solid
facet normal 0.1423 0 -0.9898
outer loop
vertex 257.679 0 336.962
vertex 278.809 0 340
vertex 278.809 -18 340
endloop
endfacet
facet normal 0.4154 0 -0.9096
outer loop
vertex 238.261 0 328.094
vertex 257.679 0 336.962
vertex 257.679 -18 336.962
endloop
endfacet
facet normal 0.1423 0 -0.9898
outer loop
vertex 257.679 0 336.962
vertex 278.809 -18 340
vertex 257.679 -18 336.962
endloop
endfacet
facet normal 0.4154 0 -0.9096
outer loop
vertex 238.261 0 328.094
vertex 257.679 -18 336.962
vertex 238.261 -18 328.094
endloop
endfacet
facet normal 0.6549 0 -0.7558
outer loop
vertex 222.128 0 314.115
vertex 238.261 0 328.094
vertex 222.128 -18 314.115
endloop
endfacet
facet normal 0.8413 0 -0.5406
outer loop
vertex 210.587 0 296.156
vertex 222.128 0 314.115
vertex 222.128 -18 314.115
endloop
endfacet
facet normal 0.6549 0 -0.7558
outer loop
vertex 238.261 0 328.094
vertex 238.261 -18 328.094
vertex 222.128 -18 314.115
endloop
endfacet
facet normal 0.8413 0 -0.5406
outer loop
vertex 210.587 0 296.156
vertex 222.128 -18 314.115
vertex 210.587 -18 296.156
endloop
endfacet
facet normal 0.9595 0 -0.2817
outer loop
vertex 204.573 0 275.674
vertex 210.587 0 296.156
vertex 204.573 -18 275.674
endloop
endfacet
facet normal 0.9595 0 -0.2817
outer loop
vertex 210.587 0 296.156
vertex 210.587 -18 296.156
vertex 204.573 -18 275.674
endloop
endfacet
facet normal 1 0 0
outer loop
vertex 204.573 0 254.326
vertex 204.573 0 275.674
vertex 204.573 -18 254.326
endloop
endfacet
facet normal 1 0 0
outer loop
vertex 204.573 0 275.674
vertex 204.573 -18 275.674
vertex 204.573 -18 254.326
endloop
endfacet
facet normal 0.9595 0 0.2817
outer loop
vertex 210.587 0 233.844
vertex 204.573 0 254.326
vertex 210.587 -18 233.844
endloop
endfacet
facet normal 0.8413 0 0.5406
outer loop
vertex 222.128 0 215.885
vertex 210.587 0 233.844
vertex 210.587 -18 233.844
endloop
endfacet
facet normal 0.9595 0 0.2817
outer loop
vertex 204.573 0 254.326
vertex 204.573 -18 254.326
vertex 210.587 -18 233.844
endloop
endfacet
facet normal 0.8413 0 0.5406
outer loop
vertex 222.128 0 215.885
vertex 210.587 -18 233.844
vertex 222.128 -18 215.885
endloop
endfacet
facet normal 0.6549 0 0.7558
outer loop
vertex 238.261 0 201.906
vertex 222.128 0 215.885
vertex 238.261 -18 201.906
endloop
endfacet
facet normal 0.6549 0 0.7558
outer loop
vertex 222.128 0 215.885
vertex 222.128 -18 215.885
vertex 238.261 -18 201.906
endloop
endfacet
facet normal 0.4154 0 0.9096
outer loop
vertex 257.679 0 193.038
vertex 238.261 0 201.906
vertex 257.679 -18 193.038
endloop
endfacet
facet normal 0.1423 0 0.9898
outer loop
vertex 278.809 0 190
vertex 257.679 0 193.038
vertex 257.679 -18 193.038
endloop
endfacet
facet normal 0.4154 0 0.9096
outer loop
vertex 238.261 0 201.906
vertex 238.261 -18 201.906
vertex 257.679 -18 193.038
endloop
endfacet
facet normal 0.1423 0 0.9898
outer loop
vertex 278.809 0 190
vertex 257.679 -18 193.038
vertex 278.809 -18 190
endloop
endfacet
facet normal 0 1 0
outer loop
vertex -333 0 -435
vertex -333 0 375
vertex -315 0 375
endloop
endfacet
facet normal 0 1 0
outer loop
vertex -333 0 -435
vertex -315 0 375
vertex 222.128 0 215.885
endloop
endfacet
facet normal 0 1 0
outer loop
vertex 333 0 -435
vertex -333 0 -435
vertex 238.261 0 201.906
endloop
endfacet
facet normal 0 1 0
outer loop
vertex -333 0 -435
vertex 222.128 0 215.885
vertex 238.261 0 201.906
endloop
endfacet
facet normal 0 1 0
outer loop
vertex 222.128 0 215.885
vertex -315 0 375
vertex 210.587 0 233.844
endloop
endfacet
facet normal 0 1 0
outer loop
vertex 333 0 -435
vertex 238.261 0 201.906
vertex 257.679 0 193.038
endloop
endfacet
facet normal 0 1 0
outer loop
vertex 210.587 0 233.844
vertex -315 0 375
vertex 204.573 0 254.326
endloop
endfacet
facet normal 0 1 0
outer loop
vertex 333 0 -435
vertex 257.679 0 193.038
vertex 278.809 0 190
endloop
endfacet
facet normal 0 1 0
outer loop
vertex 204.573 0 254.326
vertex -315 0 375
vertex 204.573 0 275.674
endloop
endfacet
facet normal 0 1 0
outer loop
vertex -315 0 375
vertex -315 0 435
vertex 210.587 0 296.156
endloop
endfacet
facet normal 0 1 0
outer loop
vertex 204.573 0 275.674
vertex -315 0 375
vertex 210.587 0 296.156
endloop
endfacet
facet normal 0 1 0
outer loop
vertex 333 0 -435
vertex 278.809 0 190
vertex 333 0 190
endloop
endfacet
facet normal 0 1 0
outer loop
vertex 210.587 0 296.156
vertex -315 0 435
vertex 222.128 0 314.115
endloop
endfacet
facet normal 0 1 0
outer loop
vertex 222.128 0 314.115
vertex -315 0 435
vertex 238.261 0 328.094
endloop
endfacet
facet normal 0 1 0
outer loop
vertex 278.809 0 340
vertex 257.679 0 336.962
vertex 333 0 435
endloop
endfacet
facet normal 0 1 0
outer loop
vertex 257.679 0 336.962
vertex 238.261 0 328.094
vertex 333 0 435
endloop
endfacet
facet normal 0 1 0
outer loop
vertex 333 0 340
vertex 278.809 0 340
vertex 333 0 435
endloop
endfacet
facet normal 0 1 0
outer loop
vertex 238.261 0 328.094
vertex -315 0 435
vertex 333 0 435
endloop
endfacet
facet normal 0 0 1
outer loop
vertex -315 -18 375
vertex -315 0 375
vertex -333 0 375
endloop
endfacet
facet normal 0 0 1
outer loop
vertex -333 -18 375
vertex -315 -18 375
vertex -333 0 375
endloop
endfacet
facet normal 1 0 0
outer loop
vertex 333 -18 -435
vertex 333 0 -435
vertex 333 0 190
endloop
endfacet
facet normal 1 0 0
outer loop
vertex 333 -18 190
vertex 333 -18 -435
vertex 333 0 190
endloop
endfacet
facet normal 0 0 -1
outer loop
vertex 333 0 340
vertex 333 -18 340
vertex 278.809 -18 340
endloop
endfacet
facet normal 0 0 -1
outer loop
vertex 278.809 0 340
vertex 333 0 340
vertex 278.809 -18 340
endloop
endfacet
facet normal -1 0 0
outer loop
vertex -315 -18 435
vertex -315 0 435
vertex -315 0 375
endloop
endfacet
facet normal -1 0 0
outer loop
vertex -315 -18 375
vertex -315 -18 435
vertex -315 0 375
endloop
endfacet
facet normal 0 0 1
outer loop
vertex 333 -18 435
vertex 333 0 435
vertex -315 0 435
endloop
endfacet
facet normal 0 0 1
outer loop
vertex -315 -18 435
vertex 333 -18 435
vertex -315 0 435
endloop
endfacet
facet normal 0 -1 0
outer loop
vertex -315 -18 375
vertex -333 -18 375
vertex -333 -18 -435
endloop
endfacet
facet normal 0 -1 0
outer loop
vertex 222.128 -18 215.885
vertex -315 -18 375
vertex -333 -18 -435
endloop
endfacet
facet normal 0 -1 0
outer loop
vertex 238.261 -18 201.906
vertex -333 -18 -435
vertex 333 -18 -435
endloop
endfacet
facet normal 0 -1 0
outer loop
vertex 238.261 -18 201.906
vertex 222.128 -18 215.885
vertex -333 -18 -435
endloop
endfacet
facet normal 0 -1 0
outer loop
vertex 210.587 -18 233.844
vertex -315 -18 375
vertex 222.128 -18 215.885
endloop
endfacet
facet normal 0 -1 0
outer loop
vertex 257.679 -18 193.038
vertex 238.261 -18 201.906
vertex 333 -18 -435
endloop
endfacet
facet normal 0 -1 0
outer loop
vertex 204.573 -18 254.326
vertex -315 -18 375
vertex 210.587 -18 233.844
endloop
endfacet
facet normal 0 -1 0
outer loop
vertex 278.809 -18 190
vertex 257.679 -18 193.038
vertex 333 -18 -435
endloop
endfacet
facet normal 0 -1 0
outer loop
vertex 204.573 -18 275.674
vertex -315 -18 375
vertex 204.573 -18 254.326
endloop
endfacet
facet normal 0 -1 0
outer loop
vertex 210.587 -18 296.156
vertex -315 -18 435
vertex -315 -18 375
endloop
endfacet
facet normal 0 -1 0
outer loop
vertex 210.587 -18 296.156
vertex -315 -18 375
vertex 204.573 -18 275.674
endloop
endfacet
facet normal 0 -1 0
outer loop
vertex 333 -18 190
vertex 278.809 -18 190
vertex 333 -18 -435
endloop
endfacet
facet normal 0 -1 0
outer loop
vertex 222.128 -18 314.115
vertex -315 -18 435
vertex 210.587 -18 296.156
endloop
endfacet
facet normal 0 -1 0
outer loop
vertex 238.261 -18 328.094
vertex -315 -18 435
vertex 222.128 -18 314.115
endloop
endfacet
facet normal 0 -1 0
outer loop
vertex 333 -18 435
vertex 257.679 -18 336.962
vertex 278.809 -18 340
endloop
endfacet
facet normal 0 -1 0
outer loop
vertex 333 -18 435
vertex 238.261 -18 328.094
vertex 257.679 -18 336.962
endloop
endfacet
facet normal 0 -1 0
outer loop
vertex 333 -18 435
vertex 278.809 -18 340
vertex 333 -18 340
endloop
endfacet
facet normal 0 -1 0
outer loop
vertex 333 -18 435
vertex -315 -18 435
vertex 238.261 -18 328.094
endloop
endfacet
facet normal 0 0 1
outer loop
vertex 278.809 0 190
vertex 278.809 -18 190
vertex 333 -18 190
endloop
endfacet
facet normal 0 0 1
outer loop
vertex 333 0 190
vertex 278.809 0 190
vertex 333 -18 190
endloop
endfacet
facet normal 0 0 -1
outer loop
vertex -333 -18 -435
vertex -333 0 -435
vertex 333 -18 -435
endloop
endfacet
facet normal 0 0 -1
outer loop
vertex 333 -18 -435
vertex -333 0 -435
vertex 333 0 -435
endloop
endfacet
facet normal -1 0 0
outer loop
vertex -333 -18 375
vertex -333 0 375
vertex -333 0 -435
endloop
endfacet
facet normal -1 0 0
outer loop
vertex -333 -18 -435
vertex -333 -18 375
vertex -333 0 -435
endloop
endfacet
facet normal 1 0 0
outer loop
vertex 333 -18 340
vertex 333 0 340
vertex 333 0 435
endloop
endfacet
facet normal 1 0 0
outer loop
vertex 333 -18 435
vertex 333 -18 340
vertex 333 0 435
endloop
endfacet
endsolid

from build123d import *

# Parameters (mm, degrees)
F1_DEPTH = 18
F3_DEPTH = 18


with BuildPart() as f1:
    # F0 (on Front) → F1 (new body)
    with BuildSketch(Plane.XZ):
        Polygon((333, -435), (333, 435), (-315, 435), (-315, 375), (-333, 375), (-333, -435), align=None)
    extrude(amount=F1_DEPTH)

    # F2 (on face) → F3 (cut)
    with BuildSketch(Plane.XZ.offset(18)):
        with BuildLine():
            Line((333, 340), (278.80919, 340))
            ThreePointArc((278.80919, 340), (203.80919, 265), (278.80919, 190))
            Line((278.80919, 190), (333, 190))
            Line((333, 190), (333, 340))
        make_face()
    extrude(amount=-F3_DEPTH, mode=Mode.SUBTRACT)


solid = f1.part
